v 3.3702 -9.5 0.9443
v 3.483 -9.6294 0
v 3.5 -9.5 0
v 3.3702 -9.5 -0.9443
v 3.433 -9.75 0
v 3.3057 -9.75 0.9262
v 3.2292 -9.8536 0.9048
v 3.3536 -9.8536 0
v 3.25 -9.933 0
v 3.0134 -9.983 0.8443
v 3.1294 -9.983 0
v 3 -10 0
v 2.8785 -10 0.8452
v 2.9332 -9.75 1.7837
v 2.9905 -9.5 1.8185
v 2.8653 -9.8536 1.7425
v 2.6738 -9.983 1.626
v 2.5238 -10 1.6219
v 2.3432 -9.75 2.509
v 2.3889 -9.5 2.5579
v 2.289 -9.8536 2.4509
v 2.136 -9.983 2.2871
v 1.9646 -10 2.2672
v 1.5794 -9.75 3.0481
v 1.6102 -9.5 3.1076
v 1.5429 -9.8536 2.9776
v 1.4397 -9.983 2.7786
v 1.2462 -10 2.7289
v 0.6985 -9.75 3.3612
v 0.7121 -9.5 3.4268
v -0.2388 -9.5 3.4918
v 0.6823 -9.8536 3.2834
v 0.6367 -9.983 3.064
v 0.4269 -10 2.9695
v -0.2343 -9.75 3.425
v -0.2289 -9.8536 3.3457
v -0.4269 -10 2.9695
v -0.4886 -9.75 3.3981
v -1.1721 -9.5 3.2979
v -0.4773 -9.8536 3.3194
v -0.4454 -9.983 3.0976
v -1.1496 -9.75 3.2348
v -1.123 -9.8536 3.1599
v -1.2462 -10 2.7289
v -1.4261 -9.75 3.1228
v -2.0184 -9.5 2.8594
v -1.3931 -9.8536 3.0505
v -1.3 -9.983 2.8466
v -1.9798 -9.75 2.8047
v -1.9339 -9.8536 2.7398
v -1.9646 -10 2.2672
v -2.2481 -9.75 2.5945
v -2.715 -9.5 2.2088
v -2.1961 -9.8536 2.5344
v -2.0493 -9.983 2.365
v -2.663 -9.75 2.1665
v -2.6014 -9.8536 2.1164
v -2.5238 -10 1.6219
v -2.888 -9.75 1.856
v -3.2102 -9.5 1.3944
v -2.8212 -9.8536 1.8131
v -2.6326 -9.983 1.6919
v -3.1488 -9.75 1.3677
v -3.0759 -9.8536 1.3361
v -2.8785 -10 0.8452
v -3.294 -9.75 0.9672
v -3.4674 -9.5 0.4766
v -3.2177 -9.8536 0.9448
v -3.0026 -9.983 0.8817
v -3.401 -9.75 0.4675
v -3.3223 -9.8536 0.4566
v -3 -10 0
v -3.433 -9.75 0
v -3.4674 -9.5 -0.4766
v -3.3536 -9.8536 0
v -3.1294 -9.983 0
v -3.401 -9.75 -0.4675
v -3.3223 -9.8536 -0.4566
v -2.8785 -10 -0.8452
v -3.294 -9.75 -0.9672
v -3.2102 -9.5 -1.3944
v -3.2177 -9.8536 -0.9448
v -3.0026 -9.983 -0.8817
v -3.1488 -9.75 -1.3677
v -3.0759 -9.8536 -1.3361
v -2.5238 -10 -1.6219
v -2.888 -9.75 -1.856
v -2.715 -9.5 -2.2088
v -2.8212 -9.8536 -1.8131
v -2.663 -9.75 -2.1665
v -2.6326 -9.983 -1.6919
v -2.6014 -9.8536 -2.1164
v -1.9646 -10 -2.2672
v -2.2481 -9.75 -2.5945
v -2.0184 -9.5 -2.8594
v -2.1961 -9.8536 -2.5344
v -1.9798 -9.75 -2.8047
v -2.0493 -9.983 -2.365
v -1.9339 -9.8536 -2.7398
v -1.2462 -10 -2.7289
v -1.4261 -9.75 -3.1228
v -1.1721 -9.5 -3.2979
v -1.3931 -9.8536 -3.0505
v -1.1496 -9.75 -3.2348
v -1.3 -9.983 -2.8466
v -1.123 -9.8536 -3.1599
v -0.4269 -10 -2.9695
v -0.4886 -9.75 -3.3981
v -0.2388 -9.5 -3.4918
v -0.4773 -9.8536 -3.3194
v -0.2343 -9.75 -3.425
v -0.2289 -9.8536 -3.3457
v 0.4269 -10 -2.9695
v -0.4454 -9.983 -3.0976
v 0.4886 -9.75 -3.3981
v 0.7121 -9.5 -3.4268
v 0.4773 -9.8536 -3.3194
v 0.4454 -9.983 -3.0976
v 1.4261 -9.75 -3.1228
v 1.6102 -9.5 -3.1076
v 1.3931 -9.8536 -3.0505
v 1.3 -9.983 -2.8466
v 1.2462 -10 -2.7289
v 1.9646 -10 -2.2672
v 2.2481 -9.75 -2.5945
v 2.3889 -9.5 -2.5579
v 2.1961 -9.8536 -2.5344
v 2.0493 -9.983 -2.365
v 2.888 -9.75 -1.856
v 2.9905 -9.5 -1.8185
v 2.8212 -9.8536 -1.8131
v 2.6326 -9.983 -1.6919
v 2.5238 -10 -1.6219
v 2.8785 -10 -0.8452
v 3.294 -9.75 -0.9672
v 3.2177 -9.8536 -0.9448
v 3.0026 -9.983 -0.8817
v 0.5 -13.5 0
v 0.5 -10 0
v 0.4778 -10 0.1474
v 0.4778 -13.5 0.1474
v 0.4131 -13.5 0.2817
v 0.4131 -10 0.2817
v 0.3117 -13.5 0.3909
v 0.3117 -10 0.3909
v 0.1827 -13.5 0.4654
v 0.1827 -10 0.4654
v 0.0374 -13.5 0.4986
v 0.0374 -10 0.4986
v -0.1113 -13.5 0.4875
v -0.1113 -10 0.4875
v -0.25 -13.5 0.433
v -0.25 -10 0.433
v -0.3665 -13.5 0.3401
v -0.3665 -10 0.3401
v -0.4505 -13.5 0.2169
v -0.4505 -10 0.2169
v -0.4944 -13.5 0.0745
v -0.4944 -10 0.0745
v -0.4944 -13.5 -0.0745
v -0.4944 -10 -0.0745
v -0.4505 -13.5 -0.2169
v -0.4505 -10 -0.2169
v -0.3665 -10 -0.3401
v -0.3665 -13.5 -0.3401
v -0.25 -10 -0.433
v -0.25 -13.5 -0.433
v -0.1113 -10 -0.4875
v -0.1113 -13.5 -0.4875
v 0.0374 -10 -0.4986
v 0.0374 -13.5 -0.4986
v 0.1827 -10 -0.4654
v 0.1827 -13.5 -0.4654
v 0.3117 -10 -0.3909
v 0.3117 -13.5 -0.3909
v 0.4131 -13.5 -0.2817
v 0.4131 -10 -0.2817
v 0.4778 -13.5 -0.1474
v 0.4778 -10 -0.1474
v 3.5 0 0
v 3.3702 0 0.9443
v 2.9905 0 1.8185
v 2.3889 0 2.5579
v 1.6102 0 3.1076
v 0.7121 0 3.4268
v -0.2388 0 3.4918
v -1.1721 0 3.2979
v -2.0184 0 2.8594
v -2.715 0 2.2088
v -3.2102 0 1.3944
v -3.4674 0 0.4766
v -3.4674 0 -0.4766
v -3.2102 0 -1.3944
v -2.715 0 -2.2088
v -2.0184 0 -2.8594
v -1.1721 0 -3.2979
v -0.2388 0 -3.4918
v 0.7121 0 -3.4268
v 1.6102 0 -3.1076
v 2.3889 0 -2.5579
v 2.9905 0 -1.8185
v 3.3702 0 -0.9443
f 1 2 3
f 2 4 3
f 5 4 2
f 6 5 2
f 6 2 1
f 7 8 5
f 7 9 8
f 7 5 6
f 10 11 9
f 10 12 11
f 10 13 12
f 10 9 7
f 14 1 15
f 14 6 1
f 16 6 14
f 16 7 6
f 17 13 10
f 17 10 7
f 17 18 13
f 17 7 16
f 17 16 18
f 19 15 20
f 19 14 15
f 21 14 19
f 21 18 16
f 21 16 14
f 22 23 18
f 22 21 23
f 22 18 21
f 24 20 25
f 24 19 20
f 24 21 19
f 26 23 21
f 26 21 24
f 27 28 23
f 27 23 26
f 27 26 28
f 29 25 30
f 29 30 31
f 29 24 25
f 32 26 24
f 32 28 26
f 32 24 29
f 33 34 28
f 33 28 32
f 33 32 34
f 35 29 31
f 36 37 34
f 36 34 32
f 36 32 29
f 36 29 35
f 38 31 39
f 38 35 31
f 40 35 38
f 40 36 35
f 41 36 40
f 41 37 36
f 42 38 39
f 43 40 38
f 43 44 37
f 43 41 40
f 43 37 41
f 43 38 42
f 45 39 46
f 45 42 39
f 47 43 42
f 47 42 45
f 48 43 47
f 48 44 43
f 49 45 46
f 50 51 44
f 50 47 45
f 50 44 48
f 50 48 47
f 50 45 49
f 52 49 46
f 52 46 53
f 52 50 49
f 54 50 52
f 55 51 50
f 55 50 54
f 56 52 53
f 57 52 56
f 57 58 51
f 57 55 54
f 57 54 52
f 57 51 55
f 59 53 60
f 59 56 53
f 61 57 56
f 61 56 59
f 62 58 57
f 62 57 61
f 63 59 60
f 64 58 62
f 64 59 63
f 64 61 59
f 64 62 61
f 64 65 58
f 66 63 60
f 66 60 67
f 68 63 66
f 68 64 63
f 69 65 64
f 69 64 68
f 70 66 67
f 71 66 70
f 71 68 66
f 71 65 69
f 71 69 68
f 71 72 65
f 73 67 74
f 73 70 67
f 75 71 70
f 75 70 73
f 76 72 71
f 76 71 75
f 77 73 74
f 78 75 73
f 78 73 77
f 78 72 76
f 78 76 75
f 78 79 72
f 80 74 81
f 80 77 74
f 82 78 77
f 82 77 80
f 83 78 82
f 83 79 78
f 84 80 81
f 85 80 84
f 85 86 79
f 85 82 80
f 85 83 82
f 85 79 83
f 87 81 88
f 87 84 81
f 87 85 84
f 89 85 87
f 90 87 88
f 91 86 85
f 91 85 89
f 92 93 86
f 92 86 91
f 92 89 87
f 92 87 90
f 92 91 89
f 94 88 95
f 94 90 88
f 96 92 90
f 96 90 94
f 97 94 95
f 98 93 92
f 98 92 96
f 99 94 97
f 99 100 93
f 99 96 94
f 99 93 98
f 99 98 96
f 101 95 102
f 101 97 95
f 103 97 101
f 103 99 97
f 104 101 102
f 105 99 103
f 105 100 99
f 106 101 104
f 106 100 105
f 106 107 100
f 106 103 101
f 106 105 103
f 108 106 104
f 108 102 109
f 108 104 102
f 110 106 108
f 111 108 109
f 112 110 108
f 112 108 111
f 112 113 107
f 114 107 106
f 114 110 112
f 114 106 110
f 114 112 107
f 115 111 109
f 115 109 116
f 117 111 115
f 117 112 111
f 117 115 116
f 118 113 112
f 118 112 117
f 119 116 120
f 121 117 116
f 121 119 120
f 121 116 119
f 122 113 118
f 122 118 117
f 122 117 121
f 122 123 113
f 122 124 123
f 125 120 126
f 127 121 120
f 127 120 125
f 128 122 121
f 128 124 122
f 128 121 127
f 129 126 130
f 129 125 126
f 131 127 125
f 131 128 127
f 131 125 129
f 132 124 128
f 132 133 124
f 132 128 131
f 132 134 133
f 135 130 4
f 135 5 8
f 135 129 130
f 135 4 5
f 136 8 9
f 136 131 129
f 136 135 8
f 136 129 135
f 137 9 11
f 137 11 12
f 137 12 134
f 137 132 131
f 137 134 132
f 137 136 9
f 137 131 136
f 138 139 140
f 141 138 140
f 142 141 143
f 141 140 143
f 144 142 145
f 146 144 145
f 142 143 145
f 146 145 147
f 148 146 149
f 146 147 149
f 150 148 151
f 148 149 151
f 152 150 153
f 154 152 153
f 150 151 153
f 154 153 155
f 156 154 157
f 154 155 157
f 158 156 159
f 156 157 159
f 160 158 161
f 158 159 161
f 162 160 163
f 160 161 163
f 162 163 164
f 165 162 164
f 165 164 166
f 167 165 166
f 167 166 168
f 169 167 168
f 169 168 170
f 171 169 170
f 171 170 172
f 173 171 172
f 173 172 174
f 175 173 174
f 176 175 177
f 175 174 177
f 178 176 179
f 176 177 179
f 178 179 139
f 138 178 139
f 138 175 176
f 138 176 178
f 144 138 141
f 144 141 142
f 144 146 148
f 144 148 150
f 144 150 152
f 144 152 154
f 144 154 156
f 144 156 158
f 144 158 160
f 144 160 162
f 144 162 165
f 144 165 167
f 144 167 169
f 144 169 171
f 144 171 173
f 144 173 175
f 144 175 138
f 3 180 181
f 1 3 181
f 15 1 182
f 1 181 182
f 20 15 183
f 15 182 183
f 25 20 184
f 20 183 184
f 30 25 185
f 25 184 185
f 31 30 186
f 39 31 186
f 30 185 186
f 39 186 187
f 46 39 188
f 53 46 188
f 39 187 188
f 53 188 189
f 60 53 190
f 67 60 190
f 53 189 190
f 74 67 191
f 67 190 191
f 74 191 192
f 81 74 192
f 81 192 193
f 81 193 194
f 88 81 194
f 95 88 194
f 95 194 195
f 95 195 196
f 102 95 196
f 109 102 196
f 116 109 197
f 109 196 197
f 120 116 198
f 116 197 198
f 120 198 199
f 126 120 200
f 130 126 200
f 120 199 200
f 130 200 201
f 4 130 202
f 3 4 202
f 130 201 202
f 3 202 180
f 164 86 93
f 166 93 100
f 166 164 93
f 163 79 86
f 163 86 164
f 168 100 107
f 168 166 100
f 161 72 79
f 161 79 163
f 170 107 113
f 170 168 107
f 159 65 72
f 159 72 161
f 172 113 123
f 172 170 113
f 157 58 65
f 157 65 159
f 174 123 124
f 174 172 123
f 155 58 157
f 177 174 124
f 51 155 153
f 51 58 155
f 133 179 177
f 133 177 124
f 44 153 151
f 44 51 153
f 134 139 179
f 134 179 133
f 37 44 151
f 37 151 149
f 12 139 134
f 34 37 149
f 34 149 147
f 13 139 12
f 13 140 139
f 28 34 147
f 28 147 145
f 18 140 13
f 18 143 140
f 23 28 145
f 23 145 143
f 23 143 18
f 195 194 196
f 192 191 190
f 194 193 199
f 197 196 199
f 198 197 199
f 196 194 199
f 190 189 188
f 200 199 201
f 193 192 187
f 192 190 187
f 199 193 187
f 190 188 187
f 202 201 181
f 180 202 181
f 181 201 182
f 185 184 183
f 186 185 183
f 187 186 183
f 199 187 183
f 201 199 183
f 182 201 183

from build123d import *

# Parameters (mm, degrees)
F0_R     = 3.5
F1_DEPTH = 10
F2_R     = 0.5
F3_R     = 0.5
F4_DEPTH = 3.5


with BuildPart() as f1:
    # F0 (on Front) → F1 (new body)
    with BuildSketch(Plane.XZ):
        Circle(F0_R)
    extrude(amount=F1_DEPTH)

    # F2
    f2_edges = [f1.edges().sort_by_distance(p)[0] for p in [
        (-3.5, -10, 0),
    ]]
    fillet(f2_edges, radius=F2_R)

    # F3 (on face) → F4 (join)
    with BuildSketch(Plane.XZ.offset(10)):
        Circle(F3_R)
    extrude(amount=F4_DEPTH)


solid = f1.part
